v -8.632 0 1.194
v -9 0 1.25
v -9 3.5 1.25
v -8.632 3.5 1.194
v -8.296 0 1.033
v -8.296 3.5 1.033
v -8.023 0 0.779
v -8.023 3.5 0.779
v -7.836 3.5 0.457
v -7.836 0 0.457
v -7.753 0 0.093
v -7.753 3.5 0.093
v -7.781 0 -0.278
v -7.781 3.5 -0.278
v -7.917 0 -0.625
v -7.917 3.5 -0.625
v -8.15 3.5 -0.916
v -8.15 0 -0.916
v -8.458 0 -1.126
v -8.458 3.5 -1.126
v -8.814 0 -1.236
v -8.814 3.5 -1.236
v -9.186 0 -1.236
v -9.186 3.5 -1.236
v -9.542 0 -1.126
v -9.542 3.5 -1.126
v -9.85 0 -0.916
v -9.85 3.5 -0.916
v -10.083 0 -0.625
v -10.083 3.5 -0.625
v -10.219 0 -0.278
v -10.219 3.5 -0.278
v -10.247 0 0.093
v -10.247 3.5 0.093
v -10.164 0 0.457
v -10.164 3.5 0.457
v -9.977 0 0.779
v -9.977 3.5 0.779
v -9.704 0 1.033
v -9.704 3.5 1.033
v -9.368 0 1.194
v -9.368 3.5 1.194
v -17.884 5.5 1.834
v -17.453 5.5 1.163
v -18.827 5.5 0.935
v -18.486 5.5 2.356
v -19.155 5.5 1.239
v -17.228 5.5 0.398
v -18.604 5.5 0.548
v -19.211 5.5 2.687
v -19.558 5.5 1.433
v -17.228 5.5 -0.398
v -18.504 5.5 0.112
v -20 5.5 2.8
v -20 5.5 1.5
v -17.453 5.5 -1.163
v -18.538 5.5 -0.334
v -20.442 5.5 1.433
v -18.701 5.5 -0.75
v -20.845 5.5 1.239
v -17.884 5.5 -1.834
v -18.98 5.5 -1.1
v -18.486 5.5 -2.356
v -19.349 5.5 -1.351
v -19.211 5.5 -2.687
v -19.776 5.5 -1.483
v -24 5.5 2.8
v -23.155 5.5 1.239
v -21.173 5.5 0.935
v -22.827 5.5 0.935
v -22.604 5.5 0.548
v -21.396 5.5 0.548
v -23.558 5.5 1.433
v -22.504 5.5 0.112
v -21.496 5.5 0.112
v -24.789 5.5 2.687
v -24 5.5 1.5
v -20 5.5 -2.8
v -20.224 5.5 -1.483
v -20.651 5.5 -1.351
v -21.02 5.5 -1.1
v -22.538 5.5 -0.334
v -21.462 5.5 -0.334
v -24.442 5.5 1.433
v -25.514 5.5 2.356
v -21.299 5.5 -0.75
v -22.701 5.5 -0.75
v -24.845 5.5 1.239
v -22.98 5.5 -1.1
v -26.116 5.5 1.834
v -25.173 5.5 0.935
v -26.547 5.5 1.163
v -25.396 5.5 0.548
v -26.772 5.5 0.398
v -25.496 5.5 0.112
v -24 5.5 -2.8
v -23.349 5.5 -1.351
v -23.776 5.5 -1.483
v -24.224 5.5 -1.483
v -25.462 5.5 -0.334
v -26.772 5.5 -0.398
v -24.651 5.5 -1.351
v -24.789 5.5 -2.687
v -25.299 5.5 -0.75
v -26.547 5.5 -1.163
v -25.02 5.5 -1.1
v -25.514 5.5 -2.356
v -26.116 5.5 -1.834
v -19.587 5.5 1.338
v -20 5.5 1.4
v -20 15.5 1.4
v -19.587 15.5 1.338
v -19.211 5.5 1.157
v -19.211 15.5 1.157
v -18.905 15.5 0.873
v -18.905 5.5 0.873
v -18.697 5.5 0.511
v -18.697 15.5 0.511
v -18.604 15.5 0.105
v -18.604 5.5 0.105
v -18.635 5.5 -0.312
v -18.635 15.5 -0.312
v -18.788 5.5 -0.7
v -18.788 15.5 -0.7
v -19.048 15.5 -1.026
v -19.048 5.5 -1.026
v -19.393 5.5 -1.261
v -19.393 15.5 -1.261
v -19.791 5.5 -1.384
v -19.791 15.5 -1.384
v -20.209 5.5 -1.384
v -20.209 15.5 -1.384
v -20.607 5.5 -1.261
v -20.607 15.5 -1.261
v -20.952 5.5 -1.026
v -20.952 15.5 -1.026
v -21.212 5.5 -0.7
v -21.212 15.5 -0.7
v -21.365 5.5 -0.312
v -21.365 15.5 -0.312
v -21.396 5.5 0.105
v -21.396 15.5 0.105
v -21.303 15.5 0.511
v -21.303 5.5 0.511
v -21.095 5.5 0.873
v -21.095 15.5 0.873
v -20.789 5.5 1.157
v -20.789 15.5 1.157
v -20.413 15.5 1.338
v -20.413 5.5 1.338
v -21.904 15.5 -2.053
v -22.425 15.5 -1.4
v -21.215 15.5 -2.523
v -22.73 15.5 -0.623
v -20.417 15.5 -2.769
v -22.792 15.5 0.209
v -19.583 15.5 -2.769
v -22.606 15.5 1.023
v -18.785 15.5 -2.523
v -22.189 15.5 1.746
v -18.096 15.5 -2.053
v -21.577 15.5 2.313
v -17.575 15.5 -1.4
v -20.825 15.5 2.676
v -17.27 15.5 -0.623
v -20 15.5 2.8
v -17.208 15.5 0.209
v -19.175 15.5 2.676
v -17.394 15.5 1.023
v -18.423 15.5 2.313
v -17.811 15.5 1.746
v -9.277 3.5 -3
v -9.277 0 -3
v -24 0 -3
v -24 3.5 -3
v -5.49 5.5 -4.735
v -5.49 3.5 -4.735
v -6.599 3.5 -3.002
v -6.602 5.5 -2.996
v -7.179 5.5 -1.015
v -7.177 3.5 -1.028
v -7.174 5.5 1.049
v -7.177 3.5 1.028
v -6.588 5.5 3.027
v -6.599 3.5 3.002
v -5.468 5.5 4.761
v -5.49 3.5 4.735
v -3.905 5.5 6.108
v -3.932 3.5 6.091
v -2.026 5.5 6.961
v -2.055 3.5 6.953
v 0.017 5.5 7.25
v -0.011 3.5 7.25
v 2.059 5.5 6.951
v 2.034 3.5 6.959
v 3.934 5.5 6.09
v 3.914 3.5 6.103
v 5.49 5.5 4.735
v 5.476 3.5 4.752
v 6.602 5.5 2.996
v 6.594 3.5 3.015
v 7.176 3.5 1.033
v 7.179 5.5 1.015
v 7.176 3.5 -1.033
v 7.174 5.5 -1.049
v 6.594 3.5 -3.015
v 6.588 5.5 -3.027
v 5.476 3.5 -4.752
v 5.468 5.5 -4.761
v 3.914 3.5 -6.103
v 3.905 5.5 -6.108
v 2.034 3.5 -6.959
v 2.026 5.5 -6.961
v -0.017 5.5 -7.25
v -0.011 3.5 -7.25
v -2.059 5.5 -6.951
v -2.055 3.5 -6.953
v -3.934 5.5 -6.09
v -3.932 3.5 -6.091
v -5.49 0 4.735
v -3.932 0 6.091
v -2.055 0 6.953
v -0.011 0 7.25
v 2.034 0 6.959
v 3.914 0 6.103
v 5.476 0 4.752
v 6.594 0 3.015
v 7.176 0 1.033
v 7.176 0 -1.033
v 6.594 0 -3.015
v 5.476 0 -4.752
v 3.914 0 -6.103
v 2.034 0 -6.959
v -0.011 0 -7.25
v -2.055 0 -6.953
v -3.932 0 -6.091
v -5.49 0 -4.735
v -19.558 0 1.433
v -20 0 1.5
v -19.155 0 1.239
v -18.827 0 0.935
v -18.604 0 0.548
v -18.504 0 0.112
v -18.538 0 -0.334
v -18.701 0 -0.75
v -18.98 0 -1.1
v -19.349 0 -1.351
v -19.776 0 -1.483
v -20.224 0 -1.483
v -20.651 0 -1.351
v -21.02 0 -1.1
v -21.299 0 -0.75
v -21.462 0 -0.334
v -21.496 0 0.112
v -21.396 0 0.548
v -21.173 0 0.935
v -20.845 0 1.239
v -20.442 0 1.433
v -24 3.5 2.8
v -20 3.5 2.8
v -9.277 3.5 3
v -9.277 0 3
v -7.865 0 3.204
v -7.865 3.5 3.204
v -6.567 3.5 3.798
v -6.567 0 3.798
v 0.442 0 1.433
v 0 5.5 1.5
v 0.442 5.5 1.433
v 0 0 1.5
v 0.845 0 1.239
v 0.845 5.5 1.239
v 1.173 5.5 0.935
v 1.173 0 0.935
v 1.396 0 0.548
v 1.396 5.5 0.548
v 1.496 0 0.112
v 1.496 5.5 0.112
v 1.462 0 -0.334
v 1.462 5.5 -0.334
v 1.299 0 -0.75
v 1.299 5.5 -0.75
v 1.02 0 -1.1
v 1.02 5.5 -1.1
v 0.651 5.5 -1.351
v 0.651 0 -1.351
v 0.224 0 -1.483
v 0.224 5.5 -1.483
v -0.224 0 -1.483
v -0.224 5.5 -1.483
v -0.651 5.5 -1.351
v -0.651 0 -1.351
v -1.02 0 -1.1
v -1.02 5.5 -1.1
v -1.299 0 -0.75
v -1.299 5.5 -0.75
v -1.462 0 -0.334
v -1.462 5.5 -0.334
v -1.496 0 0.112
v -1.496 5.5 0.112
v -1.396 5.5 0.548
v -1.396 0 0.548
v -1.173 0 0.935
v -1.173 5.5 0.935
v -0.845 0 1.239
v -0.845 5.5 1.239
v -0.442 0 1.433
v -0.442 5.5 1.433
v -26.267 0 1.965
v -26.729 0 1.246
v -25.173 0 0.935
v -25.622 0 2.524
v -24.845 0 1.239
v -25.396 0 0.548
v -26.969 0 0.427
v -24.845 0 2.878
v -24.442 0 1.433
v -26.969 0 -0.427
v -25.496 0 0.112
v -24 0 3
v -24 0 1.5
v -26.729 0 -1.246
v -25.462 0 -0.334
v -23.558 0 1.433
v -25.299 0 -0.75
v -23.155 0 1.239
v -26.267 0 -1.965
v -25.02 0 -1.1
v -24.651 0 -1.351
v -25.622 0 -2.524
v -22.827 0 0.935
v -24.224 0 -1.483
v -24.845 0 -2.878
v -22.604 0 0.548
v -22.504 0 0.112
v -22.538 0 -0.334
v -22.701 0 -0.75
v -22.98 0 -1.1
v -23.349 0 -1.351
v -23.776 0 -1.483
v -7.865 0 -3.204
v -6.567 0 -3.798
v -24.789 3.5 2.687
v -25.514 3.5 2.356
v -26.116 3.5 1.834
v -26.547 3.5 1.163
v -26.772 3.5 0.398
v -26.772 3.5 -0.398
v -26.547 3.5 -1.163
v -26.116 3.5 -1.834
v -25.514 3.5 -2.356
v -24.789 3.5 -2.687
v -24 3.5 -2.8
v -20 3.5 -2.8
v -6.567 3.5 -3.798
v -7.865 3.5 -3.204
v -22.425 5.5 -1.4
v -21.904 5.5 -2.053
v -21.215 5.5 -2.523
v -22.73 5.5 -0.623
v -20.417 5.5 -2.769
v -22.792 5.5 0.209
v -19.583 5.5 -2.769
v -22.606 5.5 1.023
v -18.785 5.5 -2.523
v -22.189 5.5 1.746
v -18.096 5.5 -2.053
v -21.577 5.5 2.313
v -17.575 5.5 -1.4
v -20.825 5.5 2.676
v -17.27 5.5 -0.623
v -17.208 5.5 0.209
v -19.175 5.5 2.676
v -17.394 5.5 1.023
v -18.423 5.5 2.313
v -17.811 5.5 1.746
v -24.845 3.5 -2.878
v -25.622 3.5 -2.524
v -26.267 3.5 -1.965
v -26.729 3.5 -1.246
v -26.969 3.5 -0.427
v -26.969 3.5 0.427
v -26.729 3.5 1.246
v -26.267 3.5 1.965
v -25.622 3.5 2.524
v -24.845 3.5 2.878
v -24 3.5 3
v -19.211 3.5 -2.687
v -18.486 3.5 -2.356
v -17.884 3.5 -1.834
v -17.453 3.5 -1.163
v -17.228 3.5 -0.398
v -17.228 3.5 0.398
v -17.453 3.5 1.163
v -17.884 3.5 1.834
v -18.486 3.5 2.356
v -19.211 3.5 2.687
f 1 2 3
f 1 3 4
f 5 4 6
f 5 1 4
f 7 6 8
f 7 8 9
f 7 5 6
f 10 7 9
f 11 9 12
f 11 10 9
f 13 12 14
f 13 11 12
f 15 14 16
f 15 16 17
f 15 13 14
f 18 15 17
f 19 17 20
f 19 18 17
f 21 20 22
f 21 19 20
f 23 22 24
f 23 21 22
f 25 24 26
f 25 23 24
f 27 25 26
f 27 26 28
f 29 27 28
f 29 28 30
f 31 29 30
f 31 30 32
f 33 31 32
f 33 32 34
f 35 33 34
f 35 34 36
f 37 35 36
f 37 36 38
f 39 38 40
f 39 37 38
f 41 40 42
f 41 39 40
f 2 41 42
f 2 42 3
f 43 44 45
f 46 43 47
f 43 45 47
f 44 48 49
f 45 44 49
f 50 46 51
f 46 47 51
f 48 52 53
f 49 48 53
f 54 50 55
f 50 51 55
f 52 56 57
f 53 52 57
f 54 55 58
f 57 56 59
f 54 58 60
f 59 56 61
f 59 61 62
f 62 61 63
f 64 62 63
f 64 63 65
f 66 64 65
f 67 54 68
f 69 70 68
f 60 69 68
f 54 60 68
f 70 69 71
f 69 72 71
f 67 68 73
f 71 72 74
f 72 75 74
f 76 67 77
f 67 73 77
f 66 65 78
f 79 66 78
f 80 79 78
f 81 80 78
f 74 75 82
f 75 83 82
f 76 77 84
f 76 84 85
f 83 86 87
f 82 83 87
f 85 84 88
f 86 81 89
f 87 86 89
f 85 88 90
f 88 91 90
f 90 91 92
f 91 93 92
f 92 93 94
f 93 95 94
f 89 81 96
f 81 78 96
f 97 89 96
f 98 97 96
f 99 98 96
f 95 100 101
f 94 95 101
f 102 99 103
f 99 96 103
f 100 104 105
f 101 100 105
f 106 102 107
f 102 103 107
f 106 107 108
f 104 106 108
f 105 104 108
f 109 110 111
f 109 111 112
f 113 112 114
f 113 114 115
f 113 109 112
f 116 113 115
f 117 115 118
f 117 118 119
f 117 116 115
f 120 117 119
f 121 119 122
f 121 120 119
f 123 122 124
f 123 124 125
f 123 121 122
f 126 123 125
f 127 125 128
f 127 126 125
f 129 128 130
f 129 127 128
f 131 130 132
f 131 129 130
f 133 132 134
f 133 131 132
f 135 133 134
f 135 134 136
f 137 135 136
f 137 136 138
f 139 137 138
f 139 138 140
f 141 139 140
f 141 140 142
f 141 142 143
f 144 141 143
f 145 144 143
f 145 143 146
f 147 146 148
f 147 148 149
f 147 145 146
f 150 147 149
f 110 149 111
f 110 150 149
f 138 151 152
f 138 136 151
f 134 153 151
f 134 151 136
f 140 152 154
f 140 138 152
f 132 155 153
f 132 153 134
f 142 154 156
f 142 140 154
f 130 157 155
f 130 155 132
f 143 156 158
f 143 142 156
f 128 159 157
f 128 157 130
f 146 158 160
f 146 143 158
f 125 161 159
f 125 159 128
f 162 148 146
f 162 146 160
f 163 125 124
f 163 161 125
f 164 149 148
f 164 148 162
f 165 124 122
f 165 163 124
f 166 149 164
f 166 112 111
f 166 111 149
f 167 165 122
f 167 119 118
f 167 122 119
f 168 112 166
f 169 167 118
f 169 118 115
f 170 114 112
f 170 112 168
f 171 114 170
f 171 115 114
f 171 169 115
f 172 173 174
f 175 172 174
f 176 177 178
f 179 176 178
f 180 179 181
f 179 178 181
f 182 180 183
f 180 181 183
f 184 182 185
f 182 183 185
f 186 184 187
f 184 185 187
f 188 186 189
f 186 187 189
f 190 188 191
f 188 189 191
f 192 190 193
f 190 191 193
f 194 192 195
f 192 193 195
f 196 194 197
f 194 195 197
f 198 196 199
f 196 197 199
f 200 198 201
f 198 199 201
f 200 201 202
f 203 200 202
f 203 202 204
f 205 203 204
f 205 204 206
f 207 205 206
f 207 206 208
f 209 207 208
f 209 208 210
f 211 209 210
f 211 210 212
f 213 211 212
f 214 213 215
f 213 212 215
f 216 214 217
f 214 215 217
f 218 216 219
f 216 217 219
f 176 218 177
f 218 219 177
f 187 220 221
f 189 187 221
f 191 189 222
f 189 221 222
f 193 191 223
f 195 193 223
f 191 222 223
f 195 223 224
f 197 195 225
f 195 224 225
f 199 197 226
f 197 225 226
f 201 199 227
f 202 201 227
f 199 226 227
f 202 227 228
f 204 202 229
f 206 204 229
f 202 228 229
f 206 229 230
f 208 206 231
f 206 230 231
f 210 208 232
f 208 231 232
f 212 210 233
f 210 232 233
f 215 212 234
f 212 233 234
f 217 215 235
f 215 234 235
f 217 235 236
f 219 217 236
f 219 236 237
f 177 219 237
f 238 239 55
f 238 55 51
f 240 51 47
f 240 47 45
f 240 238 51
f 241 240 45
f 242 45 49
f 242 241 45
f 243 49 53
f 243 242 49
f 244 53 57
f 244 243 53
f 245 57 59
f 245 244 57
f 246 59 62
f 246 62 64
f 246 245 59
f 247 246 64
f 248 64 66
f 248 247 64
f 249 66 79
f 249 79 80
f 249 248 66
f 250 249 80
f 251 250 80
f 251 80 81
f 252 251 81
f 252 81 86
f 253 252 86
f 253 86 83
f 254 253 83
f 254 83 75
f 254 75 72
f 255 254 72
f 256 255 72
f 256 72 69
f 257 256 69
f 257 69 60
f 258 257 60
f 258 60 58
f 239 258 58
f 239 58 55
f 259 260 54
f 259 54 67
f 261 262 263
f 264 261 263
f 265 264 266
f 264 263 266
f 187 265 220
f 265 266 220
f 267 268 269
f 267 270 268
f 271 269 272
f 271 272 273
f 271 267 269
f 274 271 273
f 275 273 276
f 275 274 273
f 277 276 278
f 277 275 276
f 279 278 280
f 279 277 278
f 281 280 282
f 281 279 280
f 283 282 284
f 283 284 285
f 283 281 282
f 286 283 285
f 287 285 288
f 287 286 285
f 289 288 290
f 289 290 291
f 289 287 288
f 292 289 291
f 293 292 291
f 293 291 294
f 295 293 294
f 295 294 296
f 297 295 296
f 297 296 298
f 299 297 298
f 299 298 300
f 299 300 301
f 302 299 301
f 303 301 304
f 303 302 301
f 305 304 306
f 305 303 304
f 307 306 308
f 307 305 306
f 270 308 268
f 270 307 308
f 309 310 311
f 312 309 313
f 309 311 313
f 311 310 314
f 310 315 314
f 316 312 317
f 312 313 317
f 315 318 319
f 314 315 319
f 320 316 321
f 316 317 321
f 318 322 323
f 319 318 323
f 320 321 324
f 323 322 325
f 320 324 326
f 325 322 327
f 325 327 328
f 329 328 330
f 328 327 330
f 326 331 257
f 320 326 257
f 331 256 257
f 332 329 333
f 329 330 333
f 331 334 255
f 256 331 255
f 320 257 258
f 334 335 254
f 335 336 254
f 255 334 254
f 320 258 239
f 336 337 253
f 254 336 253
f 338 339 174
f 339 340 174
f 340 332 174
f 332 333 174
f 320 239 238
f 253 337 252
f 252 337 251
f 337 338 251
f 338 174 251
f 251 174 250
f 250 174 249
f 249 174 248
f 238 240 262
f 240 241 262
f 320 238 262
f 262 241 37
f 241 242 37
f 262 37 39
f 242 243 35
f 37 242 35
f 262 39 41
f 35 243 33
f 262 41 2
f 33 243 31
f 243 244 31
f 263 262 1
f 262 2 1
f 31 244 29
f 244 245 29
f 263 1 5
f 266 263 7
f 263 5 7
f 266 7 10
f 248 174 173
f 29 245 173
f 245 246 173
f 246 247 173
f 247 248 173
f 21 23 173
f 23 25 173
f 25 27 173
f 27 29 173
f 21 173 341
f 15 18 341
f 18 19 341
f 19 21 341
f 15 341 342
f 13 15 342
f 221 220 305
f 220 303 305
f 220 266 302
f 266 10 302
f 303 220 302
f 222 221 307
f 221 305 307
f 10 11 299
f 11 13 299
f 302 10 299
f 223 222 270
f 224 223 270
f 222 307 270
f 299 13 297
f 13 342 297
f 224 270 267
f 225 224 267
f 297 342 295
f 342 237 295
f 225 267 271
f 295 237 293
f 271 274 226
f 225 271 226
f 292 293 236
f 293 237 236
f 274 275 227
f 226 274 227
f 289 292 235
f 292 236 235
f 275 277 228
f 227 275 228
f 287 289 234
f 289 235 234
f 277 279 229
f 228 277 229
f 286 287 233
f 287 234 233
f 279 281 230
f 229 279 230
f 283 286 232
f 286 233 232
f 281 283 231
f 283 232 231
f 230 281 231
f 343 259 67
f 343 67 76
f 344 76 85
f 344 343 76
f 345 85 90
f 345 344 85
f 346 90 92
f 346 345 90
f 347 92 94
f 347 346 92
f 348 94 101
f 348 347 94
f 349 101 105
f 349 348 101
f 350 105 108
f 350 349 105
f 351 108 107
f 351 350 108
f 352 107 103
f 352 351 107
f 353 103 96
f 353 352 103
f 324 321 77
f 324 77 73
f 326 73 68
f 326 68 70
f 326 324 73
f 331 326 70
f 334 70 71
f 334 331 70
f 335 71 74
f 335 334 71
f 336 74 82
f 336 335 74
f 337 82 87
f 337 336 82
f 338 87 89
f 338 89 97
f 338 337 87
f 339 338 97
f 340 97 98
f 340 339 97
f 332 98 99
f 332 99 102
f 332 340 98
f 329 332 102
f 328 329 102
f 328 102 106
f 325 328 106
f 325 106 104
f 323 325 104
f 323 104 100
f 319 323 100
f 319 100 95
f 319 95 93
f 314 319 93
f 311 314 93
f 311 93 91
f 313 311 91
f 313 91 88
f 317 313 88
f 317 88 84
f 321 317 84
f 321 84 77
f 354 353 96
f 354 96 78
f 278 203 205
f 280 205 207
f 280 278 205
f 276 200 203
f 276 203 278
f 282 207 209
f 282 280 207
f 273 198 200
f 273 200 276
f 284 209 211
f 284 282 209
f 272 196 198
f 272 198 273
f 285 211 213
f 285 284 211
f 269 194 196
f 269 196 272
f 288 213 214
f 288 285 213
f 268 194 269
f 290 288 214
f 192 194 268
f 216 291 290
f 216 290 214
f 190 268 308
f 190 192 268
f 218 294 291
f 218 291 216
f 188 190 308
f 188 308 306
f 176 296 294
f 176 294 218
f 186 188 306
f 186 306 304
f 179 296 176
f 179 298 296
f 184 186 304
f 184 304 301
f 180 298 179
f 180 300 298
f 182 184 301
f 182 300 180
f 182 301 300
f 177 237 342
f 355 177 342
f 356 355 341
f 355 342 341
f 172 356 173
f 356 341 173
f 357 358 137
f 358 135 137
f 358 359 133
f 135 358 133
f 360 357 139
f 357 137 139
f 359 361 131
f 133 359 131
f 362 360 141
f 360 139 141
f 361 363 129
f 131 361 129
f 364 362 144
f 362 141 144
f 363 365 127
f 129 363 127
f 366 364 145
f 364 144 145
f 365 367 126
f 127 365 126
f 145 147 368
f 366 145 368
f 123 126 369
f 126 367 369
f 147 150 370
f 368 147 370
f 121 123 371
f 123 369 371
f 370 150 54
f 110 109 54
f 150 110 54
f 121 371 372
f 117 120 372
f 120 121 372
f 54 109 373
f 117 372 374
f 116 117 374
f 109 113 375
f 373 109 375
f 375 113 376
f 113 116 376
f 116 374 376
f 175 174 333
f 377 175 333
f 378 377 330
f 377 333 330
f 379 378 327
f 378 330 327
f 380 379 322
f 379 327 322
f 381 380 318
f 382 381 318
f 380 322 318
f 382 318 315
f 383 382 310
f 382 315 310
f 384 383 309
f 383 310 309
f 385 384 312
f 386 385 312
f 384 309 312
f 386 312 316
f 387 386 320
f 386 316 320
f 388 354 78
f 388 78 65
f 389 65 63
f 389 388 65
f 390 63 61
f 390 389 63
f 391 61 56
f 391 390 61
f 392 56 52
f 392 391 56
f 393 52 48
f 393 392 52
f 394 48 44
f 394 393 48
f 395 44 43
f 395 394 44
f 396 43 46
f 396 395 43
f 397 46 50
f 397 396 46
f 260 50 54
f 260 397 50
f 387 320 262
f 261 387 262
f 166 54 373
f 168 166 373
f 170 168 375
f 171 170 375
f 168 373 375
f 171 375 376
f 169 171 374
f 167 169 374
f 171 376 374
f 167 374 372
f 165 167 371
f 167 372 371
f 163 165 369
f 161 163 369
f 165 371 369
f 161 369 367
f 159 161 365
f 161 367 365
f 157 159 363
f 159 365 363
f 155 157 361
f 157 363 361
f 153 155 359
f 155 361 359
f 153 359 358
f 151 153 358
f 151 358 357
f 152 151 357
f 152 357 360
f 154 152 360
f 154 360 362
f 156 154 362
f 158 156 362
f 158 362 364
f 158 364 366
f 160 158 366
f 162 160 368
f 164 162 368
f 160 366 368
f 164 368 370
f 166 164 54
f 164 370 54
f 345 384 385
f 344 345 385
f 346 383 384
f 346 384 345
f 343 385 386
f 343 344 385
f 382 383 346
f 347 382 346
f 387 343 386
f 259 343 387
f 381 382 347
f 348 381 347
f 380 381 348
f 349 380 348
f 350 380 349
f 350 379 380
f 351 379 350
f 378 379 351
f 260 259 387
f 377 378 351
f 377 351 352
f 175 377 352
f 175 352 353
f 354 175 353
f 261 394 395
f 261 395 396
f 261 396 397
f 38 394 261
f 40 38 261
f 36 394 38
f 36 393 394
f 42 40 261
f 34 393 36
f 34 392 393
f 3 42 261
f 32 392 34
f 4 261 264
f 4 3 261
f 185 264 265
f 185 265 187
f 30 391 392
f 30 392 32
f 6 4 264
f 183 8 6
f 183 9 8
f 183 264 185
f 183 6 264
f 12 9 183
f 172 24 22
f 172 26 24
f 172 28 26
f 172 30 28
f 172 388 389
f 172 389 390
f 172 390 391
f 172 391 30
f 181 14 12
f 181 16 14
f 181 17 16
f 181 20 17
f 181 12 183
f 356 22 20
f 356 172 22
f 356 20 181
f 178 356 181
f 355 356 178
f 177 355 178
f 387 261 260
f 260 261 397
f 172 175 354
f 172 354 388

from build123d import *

# Parameters (mm, degrees)
SKETCH_1_R      = 1.5
SKETCH_1_R_2    = 1.25
EXTRUDE_1_DEPTH = 3.5
SKETCH_2_R      = 7.25
SKETCH_2_R_2    = 1.5
EXTRUDE_2_DEPTH = 2
SKETCH_5_R      = 2.8
SKETCH_5_R_2    = 1.4
EXTRUDE_5_DEPTH = 10


with BuildPart() as part:
    # 草图1 → 凸台-拉伸1 (new body)
    with BuildSketch(Plane(origin=(0, 0, 0), x_dir=(1, 0, 0), z_dir=(0, 1, 0))):
        with BuildLine():
            Line((-24, -3), (-9.276987658, -3))
            ThreePointArc((-9.276987658, -3), (-7.194504838, -3.45431355), (-5.490462083, -4.734693878))
            ThreePointArc((-5.490462083, -4.734693878), (7.25, 0), (-5.490462083, 4.734693878))
            ThreePointArc((-5.490462083, 4.734693878), (-7.194504838, 3.45431355), (-9.276987658, 3))
            Line((-9.276987658, 3), (-24, 3))
            ThreePointArc((-24, 3), (-27, 0), (-24, -3))
        make_face()
        with Locations(Location((0, 0, 0), (0, 0, 270))):
            Circle(SKETCH_1_R, mode=Mode.SUBTRACT)
        with Locations(Location((-24, 0, 0), (0, 0, 270))):
            Circle(SKETCH_1_R, mode=Mode.SUBTRACT)
        with Locations(Location((-20, 0, 0), (0, 0, 270))):
            Circle(SKETCH_1_R, mode=Mode.SUBTRACT)
        with Locations(Location((-9, 0, 0), (0, 0, 270))):
            Circle(SKETCH_1_R_2, mode=Mode.SUBTRACT)
    extrude(amount=EXTRUDE_1_DEPTH)

    # 草图2 → 凸台-拉伸2 (add)
    # profile 1 of 2: a face of its own
    with BuildSketch(Plane(origin=(0, 3.5, 0), x_dir=(1, 0, 0), z_dir=(0, 1, 0))):
        with Locations(Location((0, 0, 0), (0, 0, 139.227195306))):
            Circle(SKETCH_2_R)
        with Locations(Location((0, 0, 0), (0, 0, 270))):
            Circle(SKETCH_2_R_2, mode=Mode.SUBTRACT)
    # profile 2 of 2: a face of its own
    with BuildSketch(Plane(origin=(0, 3.5, 0), x_dir=(1, 0, 0), z_dir=(0, 1, 0))):
        with BuildLine():
            Line((-24, 2.8), (-20, 2.8))
            ThreePointArc((-20, 2.8), (-17.2, 0), (-20, -2.8))
            Line((-20, -2.8), (-24, -2.8))
            ThreePointArc((-24, -2.8), (-26.8, 0), (-24, 2.8))
        make_face()
        with Locations(Location((-20, 0, 0), (0, 0, 270))):
            Circle(SKETCH_2_R_2, mode=Mode.SUBTRACT)
        with Locations(Location((-24, 0, 0), (0, 0, 270))):
            Circle(SKETCH_2_R_2, mode=Mode.SUBTRACT)
    extrude(amount=EXTRUDE_2_DEPTH)


with BuildPart() as body_2:
    # 草图5 → 凸台-拉伸5 (new body)
    with BuildSketch(Plane(origin=(0, 5.5, 0), x_dir=(1, 0, 0), z_dir=(0, 1, 0))):
        with Locations(Location((-20, 0, 0), (0, 0, 270))):
            Circle(SKETCH_5_R)
        with Locations(Location((-20, 0, 0), (0, 0, 270))):
            Circle(SKETCH_5_R_2, mode=Mode.SUBTRACT)
    extrude(amount=EXTRUDE_5_DEPTH)


solid = Compound([part.part, body_2.part])
